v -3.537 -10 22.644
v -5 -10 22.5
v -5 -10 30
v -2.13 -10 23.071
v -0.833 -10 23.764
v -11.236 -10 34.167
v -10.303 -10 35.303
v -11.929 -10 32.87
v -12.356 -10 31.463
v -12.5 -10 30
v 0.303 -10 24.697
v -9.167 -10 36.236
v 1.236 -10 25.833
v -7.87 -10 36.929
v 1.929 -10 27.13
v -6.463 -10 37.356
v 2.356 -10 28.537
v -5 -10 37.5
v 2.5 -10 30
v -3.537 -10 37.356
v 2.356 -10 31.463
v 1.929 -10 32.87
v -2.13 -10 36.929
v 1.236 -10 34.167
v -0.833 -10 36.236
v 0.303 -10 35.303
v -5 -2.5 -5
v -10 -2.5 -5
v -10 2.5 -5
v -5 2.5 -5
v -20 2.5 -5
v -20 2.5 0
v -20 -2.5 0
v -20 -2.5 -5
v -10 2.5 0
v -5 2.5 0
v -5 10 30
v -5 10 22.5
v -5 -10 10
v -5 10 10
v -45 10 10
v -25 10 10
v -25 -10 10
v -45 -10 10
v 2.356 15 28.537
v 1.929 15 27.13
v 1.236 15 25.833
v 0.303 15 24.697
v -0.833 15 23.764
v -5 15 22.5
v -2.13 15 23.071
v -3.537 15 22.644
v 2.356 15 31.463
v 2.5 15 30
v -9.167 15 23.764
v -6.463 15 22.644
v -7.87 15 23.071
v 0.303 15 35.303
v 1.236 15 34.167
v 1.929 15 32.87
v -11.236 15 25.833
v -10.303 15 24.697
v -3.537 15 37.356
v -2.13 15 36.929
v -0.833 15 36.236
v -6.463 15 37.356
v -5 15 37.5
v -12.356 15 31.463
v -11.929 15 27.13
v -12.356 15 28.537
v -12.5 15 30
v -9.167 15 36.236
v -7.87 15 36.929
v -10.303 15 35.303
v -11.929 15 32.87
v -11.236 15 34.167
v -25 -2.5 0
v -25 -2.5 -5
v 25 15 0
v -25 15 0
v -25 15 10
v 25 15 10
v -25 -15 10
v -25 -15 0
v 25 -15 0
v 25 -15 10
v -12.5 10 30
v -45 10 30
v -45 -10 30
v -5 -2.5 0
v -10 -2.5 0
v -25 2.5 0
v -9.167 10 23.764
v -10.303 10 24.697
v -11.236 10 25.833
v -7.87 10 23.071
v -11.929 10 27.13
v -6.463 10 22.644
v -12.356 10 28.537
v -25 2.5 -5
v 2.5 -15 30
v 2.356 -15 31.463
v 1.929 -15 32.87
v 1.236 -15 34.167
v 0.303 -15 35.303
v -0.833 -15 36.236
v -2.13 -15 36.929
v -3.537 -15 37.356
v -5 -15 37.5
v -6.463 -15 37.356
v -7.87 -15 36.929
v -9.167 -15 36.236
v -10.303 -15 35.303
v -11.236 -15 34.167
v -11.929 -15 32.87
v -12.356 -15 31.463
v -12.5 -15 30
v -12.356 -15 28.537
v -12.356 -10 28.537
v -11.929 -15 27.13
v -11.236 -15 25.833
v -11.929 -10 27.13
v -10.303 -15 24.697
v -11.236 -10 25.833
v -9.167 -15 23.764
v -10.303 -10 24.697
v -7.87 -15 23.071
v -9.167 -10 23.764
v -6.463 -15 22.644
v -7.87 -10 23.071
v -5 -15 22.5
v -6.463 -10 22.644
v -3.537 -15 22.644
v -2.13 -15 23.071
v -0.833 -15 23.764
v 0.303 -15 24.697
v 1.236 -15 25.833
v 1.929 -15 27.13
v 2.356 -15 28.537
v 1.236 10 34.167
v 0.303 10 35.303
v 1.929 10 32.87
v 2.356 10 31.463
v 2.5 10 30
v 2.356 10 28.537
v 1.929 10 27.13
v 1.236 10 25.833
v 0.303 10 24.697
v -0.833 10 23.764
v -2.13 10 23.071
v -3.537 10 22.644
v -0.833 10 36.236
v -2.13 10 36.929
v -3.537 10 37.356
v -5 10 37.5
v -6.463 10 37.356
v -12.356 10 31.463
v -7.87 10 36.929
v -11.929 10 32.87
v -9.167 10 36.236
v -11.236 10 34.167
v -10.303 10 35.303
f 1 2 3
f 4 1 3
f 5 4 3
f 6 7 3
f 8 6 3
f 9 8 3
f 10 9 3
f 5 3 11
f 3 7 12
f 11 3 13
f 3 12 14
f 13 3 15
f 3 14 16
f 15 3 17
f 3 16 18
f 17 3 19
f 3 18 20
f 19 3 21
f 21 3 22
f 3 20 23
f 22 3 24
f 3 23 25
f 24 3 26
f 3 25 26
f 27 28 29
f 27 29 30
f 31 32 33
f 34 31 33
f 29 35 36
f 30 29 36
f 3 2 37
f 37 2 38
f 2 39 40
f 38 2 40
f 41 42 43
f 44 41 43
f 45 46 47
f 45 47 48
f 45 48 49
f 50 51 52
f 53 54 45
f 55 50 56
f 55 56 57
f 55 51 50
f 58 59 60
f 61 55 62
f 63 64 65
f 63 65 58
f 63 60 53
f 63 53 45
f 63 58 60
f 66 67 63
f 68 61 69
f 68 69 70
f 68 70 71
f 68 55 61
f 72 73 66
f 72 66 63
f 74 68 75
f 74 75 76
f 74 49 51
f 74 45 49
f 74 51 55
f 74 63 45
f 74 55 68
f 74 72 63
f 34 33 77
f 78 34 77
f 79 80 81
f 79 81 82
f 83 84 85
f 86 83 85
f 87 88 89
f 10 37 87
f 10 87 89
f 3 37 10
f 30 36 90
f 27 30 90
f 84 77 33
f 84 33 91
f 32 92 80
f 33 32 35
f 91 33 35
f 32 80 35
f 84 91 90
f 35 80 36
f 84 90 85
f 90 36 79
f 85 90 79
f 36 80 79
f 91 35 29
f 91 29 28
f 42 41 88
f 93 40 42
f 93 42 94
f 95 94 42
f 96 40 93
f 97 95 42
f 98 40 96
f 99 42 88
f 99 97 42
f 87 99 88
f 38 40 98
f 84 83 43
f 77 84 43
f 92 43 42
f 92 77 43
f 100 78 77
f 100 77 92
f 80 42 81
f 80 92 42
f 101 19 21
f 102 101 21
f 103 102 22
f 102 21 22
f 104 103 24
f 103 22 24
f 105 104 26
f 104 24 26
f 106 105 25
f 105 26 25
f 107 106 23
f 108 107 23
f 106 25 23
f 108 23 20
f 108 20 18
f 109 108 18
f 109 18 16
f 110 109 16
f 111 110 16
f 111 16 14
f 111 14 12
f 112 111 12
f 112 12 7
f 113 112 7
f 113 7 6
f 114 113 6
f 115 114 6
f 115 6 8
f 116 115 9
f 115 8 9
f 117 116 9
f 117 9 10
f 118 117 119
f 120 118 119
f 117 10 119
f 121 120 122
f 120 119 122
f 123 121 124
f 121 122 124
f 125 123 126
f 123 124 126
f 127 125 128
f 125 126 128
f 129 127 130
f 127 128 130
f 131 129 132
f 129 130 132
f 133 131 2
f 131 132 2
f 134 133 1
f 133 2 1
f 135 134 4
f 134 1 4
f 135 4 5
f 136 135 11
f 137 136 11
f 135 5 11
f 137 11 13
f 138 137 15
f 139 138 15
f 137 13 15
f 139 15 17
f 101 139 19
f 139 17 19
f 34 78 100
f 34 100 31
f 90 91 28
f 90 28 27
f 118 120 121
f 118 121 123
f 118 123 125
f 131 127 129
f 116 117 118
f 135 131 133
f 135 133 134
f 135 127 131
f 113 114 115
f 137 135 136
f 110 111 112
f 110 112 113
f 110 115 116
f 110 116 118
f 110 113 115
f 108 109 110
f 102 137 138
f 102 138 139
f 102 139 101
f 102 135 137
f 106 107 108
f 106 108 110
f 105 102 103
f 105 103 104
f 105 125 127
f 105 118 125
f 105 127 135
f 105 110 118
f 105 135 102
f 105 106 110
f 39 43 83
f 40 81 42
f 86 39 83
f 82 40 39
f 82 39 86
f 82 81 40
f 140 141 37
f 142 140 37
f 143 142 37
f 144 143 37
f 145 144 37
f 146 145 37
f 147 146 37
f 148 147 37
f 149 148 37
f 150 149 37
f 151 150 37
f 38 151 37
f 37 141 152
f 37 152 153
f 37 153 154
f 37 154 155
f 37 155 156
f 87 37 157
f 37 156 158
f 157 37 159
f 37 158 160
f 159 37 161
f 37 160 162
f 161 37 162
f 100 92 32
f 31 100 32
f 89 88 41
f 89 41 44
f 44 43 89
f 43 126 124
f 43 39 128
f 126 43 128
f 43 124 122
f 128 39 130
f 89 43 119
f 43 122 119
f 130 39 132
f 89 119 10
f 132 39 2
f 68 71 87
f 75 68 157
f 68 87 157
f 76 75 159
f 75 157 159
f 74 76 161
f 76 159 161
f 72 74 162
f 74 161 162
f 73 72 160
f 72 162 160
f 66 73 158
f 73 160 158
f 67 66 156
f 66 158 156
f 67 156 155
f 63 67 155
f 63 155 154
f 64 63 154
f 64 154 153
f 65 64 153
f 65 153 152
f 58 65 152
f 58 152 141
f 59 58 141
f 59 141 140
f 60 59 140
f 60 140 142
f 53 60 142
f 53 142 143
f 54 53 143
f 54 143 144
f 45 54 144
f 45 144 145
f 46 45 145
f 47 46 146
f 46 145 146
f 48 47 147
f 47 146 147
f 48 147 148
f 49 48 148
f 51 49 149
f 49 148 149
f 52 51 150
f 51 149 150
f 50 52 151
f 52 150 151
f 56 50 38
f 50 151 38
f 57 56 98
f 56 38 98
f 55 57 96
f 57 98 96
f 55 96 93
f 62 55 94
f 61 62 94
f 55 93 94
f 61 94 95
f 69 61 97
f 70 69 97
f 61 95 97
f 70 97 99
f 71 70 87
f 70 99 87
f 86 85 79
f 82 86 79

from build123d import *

# Parameters (mm, degrees)
F0_W      = 50
F0_H      = 30
F1_DEPTH  = 10
F2_W      = 5
F2_H      = 5
F3_DEPTH  = 5
F5_DEPTH  = 20
F6_W      = 20
F6_H      = 20
F7_DEPTH  = 20
F8_R      = 7.5
F9_DEPTH  = 5
F10_R     = 7.5
F11_DEPTH = 5


with BuildPart() as f1:
    # F0 (on Top) → F1 (new body)
    with BuildSketch(Plane.XY):
        Rectangle(F0_W, F0_H)
    extrude(amount=F1_DEPTH)

    # F2 (on face) → F3 (join)
    with BuildSketch(Plane(origin=(0, 0, 0), x_dir=(1, 0, 0), z_dir=(0, 0, -1))):
        Polygon((-25, 2.5), (-25, 0), (-25, -2.5), (-20, -2.5), (-20, 2.5), align=None)
        with Locations((-7.5, 0)):
            Rectangle(F2_W, F2_H)
    extrude(amount=F3_DEPTH)

    # F4 (on face) → F5 (join)
    with BuildSketch(Plane.XY.offset(10)):
        Polygon((-5, 10), (-25, 10), (-25, 0), (-25, -10), (-5, -10), align=None)
    extrude(amount=F5_DEPTH)

    # F6 (on face) → F7 (join)
    with BuildSketch(Plane(origin=(-25, 0, 0), x_dir=(0, -1, 0), z_dir=(-1, 0, 0))):
        with Locations((0, 20)):
            Rectangle(F6_W, F6_H)
    extrude(amount=F7_DEPTH)

    # F8 (on face) → F9 (join)
    with BuildSketch(Plane.XZ.offset(10)):
        with Locations((-5, 30)):
            Circle(F8_R)
    extrude(amount=F9_DEPTH)

    # F10 (on face) → F11 (join)
    with BuildSketch(Plane(origin=(0, 10, 0), x_dir=(-1, 0, 0), z_dir=(0, 1, 0))):
        with Locations((5, 30)):
            Circle(F10_R)
    extrude(amount=F11_DEPTH)


solid = f1.part
